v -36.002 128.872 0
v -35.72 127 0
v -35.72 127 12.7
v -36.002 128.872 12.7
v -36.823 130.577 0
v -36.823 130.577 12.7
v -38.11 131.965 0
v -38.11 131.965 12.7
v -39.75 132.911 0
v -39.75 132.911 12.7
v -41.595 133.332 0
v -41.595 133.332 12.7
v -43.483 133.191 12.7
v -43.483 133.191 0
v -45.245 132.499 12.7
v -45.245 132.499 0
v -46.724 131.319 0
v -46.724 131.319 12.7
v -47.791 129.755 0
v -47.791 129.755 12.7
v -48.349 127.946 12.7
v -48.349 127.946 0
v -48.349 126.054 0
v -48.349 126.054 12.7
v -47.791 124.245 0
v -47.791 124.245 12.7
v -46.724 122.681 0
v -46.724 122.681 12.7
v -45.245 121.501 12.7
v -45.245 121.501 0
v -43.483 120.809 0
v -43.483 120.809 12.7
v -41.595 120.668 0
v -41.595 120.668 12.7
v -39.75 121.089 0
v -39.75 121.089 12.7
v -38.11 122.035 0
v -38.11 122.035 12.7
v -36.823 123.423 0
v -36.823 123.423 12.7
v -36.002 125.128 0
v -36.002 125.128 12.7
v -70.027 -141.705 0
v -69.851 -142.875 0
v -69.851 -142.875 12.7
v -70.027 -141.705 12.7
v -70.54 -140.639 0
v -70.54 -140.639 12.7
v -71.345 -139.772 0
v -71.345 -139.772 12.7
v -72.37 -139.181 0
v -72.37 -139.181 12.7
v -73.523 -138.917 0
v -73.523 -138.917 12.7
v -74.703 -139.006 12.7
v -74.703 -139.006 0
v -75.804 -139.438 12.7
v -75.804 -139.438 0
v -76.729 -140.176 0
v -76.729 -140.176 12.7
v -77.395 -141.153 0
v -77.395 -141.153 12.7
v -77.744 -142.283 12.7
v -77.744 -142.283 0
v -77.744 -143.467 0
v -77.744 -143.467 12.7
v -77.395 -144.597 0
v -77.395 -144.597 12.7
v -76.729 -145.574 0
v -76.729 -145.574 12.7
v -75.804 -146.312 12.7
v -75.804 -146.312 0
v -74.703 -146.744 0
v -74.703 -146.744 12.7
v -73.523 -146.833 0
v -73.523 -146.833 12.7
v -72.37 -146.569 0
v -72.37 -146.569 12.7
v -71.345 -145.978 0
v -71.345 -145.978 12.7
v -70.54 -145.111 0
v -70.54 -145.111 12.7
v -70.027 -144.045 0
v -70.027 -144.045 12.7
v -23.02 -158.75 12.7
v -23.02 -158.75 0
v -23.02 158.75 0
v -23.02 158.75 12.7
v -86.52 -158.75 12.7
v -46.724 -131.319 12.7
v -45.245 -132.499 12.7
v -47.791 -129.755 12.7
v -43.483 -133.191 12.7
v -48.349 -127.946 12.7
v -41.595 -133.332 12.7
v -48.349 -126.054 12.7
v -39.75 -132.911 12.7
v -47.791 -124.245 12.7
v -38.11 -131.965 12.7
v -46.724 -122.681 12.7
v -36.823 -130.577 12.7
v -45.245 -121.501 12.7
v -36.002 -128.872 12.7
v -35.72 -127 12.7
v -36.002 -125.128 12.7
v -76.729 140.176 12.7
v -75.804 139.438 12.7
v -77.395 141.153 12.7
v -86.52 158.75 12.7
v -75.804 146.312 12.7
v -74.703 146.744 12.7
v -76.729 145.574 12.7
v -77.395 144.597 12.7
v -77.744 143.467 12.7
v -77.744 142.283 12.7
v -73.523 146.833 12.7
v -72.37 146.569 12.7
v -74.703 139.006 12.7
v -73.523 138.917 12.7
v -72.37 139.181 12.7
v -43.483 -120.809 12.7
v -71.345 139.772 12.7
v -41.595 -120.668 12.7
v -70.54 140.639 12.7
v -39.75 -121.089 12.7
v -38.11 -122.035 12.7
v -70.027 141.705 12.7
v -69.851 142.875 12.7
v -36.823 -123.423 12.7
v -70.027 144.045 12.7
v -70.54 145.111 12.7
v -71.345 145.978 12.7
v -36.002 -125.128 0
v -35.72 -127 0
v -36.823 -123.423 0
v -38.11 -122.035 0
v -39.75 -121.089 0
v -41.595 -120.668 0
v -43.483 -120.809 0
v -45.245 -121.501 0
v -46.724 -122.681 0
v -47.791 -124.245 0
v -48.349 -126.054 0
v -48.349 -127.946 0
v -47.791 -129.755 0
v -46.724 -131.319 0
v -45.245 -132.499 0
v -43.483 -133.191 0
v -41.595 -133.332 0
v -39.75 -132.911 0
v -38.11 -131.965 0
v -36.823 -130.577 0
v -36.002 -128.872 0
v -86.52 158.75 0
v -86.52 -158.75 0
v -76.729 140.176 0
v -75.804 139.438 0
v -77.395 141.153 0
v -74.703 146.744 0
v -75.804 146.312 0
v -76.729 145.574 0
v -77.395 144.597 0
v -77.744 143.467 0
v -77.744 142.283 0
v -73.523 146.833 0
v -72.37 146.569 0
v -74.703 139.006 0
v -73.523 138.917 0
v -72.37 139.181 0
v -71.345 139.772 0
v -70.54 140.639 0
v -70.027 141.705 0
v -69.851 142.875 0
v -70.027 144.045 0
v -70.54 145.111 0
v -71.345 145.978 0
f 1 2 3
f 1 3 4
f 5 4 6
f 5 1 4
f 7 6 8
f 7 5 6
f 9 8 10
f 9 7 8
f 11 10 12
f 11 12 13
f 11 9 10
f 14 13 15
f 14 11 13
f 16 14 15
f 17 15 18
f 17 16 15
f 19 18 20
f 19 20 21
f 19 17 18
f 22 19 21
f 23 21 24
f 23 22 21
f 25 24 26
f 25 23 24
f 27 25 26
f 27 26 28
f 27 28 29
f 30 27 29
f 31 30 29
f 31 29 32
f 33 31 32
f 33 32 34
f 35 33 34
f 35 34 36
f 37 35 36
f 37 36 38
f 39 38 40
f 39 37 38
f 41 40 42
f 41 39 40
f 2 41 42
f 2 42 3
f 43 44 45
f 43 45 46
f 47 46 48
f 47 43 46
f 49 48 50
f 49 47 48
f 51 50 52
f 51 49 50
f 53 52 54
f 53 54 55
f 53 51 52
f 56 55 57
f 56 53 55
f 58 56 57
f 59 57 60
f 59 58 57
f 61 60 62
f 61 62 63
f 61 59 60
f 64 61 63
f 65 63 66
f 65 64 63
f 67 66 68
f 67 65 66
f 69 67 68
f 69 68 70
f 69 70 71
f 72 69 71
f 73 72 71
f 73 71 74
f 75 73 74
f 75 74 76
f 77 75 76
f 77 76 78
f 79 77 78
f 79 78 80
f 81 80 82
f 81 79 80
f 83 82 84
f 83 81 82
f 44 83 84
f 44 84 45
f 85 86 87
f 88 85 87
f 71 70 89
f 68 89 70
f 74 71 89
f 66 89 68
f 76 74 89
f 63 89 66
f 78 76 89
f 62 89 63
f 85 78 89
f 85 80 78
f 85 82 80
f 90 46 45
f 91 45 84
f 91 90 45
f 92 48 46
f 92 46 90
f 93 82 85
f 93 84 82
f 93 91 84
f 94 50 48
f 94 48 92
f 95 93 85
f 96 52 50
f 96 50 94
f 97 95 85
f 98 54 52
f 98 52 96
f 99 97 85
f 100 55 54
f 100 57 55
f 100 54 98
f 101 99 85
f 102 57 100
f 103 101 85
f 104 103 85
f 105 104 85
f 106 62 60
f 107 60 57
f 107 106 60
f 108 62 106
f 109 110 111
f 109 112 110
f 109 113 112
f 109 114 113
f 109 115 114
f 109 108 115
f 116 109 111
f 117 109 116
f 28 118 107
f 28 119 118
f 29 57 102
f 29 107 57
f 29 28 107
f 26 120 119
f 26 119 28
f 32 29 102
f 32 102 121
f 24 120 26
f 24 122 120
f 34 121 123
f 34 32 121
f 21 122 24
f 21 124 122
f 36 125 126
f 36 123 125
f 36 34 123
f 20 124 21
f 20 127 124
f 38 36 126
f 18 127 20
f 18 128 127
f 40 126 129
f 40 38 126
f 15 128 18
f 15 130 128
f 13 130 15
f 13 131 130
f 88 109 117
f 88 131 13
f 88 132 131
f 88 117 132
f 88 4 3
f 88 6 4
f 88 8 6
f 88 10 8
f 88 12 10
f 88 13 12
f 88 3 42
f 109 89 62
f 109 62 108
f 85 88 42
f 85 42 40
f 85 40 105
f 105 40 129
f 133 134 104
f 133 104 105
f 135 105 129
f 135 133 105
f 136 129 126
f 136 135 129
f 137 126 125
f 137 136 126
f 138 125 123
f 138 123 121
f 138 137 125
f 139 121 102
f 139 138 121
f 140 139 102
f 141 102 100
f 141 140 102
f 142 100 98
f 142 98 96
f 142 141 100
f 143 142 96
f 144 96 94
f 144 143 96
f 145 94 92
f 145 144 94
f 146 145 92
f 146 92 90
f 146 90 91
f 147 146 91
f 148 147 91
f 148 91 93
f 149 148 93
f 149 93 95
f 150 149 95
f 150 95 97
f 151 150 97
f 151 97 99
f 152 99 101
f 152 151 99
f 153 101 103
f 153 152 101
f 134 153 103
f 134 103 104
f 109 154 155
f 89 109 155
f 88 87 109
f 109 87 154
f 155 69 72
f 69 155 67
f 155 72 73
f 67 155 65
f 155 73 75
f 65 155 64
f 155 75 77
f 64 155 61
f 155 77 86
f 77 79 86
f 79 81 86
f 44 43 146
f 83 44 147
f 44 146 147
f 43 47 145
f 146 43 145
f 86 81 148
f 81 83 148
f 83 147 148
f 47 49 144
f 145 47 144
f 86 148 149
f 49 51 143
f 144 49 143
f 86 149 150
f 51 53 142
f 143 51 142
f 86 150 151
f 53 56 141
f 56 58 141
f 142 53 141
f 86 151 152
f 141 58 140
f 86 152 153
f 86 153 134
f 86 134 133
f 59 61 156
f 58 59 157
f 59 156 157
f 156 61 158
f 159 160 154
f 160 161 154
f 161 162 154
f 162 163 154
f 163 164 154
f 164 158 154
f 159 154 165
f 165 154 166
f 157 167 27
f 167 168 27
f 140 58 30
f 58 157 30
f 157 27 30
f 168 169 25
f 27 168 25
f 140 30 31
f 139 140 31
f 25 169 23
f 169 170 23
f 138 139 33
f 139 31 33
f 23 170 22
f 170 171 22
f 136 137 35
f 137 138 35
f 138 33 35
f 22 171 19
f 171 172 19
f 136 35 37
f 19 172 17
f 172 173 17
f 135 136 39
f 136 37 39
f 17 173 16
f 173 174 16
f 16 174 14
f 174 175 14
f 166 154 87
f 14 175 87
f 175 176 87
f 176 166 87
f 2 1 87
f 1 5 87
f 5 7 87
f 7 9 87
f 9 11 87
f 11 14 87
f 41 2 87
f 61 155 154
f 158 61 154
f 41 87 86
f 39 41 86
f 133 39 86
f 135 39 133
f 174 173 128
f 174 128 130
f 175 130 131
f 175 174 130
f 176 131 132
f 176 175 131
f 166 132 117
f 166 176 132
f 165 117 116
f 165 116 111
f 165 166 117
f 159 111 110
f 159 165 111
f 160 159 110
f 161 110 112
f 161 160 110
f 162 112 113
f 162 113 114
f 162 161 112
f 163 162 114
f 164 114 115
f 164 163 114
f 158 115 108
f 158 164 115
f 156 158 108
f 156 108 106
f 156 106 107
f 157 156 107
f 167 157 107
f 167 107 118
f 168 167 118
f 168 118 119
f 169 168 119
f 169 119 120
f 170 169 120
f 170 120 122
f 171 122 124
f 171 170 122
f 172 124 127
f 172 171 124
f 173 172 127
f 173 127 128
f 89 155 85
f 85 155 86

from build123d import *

# Parameters (mm, degrees)
F0_R     = 3.96875
F0_R_2   = 6.35
F1_DEPTH = 12.7


with BuildPart() as f1:
    # F0 (on Top) → F1 (new body)
    with BuildSketch(Plane.XY):
        Polygon((-23.019589, 158.75), (-86.519589, 158.75), (-86.519589, -158.75), (-58.071589, -158.75), (-23.019589, -158.75), align=None)
        with Locations((-73.819589, -142.875)):
            Circle(F0_R, mode=Mode.SUBTRACT)
        with Locations((-42.069589, -127)):
            Circle(F0_R_2, mode=Mode.SUBTRACT)
        with Locations((-73.819589, 142.875)):
            Circle(F0_R, mode=Mode.SUBTRACT)
        with Locations((-42.069589, 127)):
            Circle(F0_R_2, mode=Mode.SUBTRACT)
    extrude(amount=F1_DEPTH)


solid = f1.part
